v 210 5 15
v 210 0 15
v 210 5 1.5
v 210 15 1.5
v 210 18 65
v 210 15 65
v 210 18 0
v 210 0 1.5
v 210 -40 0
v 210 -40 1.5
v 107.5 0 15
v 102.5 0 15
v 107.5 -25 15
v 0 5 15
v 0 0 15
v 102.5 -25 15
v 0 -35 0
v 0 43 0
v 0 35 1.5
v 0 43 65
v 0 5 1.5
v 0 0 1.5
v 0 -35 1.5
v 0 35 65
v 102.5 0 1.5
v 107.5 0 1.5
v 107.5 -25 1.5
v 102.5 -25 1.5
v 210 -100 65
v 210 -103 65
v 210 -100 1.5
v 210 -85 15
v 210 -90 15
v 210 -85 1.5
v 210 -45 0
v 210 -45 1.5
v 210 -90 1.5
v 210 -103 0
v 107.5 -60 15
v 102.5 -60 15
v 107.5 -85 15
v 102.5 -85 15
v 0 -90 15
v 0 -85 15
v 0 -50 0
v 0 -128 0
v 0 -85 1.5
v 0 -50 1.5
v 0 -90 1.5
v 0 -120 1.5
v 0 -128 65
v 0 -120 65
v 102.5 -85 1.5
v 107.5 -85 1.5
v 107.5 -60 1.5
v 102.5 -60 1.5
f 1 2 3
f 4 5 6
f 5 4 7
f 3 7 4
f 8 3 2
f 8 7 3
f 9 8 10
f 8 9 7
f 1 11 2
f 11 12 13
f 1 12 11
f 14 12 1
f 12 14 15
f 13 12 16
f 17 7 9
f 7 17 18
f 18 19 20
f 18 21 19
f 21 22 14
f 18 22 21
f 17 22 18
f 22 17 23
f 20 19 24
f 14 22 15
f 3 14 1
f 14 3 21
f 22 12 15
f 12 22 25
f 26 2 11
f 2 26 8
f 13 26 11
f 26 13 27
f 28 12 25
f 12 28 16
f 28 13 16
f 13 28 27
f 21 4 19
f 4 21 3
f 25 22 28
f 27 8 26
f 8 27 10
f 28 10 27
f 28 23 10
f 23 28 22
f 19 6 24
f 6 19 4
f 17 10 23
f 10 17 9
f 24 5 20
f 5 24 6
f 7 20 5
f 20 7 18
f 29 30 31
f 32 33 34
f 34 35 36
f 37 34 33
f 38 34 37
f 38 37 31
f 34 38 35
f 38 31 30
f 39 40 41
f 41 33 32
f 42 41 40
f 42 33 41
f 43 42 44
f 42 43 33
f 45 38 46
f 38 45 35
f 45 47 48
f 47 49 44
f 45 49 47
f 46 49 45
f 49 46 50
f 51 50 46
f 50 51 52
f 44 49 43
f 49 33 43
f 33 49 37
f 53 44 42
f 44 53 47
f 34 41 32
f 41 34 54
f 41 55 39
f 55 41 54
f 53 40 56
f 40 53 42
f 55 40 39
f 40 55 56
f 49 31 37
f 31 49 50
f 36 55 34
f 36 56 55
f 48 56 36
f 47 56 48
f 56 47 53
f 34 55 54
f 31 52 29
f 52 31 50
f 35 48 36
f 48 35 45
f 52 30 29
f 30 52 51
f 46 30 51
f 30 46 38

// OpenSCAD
// file: rightWall.scad
use <leftWall.scad>

module rightWall()
{
  mirror([0,1,0])
    leftWall();
}

rightWall();
// file: leftWall.scad
sh=15;      // support height
l =210;     // construction length
ft=1.5;     // floor thickness
wt=3;       // wall thickness
wh=65;      // wall height

module leftWall()
{
  // internal support
  cube([l, 5, sh]);
  translate([(l-5)/2, -25, 0])
    cube([5, 25, sh]);
  // ground floor
  polyhedron(
    points = [
               [0, 30+5,  0],   // 0
               [l, 10+5,  0],   // 1
               [l,  -40,  0],   // 2
               [0,  -35,  0],   // 3
               [0, 30+5, ft],   // 4
               [l, 10+5, ft],   // 5
               [l,  -40, ft],   // 6
               [0,  -35, ft],   // 7
             ],
    faces = [
              // bottom surface:
              [0, 2, 1],
              [0, 3, 2],
              // top surface:
              [4, 5, 6],
              [4, 6, 7],
              // left wall:
              [0,7,3],
              [0,4,7],
              // right wall:
              [1,2,6],
              [1,6,5],
              // top wall:
              [0,1,5],
              [0,5,4],
              // bottom wall:
              [3,6,2],
              [3,7,6],
            ]
  );
  // main wall
  polyhedron(
    points = [
               [0, 30+5,     0],   // 0
               [l, 10+5,     0],   // 1
               [l, 10+5+wt,  0],   // 2
               [0, 35+5+wt,  0],   // 3
               [0, 30+5,    wh],   // 4
               [l, 10+5,    wh],   // 5
               [l, 10+5+wt, wh],   // 6
               [0, 35+5+wt, wh],   // 7
             ],
    faces = [
              // bottom surface:
              [0, 2, 1],
              [0, 3, 2],
              // top surface:
              [4, 5, 6],
              [4, 6, 7],
              // left wall:
              [0,7,3],
              [0,4,7],
              // right wall:
              [1,2,6],
              [1,6,5],
              // top wall:
              [0,1,5],
              [0,5,4],
              // bottom wall:
              [3,6,2],
              [3,7,6],
            ]
  );
}

leftWall();
// main file
use <leftWall.scad>
use <rightWall.scad>

leftWall();
translate([0, -85, 0])
  rightWall();
